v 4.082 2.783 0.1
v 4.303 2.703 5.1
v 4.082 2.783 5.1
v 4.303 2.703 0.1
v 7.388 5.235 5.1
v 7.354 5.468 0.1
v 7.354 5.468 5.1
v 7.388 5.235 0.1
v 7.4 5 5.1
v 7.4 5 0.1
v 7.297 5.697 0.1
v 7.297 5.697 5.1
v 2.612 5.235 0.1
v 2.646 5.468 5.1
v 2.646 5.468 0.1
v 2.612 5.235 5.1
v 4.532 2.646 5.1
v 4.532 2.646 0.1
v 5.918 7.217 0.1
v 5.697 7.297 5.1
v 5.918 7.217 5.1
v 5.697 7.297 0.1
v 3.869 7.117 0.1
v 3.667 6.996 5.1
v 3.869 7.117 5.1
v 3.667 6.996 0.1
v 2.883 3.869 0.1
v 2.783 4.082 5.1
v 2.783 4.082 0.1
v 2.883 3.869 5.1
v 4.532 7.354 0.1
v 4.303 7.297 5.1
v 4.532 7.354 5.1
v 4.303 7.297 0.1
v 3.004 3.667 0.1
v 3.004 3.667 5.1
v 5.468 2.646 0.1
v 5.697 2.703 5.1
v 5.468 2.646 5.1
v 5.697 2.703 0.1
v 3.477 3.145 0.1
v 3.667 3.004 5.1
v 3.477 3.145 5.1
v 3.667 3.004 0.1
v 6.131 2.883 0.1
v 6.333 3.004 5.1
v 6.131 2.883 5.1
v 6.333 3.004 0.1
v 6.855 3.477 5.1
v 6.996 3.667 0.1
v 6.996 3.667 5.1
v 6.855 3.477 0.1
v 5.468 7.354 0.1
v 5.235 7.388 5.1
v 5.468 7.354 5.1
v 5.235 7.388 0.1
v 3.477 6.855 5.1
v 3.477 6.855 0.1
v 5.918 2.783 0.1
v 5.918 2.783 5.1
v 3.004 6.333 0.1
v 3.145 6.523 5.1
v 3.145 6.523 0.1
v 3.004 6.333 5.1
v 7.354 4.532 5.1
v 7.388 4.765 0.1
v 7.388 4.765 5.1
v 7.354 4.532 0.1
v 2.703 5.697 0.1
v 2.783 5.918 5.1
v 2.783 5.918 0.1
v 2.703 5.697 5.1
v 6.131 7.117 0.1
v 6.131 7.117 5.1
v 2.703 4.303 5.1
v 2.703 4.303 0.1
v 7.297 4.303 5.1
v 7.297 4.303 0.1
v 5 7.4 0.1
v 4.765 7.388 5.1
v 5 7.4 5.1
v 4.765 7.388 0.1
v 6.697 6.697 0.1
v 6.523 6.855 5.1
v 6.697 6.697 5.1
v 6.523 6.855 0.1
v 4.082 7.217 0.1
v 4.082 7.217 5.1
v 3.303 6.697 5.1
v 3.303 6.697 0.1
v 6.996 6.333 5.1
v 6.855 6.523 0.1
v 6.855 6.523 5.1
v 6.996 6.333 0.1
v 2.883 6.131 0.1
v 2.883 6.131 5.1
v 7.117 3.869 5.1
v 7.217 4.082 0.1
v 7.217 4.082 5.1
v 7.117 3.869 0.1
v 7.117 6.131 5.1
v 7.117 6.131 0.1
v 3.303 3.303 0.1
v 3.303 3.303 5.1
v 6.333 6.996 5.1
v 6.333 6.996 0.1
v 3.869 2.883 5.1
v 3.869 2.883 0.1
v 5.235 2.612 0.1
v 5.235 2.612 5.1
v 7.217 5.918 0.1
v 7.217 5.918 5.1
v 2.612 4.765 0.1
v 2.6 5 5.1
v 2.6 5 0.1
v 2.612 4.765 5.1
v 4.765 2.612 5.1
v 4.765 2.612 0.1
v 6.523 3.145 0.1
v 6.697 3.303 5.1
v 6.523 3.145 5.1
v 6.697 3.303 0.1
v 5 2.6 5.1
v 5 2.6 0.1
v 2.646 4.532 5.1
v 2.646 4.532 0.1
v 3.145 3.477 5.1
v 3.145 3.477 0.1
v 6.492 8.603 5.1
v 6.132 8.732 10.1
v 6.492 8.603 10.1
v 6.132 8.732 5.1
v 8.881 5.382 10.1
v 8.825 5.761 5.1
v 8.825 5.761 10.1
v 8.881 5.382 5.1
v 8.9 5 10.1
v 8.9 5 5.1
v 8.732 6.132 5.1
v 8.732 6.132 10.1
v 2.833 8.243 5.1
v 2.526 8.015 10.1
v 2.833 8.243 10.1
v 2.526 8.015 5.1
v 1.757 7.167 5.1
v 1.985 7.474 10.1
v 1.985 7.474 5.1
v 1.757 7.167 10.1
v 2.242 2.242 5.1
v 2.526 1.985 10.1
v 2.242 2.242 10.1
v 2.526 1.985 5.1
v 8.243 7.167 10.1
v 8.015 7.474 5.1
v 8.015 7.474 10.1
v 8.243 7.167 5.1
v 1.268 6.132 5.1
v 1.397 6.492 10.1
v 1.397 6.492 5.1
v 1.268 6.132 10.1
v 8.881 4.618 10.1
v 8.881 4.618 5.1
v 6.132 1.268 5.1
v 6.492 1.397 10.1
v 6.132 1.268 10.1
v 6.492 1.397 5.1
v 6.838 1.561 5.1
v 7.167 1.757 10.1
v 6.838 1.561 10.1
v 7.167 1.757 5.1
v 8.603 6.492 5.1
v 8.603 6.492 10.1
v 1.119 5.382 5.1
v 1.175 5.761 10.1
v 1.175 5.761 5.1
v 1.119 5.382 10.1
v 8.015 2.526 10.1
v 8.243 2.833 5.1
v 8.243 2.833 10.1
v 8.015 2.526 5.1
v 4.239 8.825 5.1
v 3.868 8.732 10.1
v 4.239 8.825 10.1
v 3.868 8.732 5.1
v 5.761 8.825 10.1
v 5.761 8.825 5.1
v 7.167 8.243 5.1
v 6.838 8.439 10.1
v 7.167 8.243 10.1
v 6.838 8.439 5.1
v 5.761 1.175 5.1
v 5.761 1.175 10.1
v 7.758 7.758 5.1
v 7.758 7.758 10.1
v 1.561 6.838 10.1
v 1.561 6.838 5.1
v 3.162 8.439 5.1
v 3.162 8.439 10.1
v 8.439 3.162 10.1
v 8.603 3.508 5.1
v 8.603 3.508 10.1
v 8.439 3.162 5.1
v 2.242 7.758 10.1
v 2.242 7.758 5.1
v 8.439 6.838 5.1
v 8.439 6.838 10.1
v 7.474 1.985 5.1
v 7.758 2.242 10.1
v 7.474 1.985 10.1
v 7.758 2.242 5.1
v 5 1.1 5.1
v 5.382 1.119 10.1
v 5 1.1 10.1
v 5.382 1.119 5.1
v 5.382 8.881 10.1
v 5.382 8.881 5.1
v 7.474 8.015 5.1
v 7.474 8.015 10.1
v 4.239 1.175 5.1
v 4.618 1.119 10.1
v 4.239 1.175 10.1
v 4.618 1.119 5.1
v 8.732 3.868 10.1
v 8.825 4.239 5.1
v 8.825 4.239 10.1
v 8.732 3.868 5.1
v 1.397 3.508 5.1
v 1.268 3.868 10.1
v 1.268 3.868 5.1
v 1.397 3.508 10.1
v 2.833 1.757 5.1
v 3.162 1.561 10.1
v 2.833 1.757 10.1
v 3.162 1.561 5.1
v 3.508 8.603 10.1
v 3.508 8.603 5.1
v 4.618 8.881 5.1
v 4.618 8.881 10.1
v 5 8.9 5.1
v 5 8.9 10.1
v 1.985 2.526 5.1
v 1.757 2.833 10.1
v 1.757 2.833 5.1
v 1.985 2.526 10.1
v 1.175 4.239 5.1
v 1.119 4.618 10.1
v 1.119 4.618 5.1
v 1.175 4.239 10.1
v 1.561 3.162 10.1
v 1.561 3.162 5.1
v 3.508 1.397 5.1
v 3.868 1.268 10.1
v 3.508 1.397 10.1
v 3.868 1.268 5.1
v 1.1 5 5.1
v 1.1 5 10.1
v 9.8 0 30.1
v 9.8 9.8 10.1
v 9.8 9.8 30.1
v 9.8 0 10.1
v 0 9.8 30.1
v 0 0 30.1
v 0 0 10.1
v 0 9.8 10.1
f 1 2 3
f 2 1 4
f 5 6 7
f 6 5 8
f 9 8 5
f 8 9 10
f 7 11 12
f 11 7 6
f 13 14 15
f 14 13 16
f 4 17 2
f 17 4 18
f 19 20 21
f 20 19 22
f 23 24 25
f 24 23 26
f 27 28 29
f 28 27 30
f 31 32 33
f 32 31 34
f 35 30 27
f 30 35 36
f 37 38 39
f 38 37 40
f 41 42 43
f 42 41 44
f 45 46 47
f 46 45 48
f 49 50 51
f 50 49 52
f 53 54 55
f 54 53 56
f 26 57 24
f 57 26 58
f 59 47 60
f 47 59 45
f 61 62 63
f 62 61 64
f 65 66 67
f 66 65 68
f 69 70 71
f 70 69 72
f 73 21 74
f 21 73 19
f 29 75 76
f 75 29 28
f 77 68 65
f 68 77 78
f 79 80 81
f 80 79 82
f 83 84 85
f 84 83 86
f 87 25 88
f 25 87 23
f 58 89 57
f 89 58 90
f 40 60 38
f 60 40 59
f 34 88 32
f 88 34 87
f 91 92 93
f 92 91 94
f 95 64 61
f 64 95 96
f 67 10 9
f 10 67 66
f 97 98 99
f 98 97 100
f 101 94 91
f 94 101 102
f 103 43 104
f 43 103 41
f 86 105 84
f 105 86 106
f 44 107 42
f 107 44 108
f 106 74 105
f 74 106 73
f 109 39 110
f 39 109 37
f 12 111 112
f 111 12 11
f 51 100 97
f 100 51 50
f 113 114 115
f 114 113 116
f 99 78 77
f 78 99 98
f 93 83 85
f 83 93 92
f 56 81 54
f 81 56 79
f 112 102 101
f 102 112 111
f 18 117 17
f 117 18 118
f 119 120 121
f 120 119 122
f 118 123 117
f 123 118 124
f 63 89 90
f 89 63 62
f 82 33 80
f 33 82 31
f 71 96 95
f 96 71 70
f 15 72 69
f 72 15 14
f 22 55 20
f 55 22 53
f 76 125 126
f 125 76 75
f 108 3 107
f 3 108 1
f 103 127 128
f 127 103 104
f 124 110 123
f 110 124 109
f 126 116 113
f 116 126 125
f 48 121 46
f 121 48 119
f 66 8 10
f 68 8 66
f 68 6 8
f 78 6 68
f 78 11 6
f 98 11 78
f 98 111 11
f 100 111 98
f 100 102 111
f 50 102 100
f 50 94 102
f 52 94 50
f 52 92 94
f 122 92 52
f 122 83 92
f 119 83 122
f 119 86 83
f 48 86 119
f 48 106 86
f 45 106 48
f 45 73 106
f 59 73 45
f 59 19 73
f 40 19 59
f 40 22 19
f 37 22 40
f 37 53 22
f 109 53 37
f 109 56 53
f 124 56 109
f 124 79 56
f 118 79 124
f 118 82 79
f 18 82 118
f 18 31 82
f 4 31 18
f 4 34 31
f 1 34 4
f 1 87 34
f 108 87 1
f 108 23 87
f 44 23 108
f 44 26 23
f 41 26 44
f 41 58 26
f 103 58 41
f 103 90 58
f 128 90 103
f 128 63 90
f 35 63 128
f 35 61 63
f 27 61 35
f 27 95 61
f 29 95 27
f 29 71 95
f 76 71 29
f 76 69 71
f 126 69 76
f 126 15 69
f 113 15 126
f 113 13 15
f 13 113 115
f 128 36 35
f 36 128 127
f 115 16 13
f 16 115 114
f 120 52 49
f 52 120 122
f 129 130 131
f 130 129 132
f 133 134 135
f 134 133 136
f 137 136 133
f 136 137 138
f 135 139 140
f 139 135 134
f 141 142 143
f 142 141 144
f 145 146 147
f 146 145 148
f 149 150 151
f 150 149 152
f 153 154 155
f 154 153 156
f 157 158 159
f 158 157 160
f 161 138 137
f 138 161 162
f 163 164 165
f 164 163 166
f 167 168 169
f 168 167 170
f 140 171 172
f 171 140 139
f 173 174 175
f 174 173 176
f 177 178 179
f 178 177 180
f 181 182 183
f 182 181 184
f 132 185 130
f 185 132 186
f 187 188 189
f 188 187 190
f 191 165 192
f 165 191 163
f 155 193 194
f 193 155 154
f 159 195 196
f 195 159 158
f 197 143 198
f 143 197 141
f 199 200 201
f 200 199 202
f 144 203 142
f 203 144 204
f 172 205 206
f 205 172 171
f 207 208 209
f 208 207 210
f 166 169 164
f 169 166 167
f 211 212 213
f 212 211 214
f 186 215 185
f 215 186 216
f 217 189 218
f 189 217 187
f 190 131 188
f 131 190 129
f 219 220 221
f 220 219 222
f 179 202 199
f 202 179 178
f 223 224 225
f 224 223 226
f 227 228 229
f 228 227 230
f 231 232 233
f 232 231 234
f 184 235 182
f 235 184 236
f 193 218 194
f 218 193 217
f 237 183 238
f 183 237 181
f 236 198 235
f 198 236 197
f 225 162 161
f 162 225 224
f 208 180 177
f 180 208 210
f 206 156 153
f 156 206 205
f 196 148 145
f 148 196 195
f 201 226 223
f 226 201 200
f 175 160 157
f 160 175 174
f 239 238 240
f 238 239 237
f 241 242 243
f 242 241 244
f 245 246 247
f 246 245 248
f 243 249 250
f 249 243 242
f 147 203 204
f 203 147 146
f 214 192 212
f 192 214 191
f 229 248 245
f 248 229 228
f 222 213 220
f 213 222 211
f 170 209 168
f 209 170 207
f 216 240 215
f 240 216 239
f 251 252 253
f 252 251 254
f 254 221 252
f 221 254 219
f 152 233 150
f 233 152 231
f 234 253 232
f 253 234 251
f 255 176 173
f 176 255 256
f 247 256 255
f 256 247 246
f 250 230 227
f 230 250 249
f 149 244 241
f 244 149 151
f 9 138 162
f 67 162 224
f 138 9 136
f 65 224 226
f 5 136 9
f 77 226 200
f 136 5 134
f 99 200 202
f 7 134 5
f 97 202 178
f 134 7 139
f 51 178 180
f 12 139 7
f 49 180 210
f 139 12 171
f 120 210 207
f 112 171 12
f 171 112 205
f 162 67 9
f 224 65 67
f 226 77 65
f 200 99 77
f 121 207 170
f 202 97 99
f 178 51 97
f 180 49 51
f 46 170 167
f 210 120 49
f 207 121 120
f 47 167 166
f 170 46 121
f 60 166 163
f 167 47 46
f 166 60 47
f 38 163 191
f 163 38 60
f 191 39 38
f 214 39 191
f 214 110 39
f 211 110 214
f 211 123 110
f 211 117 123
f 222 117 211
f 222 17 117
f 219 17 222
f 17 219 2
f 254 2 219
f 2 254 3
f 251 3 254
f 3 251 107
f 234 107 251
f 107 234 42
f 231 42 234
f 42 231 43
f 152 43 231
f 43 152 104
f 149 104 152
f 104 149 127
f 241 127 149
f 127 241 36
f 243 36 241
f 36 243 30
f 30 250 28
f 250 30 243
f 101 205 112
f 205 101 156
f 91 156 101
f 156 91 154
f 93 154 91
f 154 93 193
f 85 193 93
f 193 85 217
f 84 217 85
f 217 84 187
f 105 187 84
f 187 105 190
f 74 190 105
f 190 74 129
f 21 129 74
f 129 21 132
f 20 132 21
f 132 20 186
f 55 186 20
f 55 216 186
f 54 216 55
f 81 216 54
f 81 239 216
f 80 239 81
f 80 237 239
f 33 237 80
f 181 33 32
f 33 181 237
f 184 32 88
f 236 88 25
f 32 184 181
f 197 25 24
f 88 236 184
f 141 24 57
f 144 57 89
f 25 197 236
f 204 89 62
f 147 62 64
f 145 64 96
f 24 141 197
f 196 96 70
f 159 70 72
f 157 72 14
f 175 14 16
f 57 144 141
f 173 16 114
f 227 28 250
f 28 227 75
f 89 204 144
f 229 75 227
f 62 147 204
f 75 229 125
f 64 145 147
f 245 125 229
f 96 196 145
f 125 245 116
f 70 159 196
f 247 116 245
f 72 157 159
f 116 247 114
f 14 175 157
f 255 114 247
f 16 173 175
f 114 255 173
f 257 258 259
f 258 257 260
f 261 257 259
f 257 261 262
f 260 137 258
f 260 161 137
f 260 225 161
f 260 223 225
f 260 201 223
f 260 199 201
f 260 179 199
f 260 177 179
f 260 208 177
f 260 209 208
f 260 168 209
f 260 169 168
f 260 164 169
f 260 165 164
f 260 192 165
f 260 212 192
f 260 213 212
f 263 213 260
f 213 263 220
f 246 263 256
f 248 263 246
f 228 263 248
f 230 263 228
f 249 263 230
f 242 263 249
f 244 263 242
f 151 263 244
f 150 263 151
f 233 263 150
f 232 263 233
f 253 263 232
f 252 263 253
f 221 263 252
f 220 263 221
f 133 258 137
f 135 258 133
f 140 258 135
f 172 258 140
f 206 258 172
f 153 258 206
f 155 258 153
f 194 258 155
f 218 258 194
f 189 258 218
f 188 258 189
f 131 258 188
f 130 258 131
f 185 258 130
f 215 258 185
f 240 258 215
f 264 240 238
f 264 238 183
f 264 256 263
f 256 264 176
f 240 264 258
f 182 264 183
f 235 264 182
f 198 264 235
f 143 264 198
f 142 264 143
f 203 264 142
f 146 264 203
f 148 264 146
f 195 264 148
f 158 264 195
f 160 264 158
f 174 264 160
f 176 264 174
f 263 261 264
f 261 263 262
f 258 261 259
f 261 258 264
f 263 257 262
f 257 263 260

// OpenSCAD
// file: constants.scad
//
//
//

$fn = 64;

$dx_unit = 10;
$dy_unit = 10;
$dz_unit = 10;

$r_inner = 2.5;
$r_outer = 4;

$play = 0.1;

$eps = 0.002;
// main file
include <constants.scad>

peg( 20 );

module peg( height ) {
    translate( [ $dx_unit/2, $dy_unit/2, $play ] ) {
        cylinder( h = $dz_unit + $eps, r = $r_inner-$play );
    };
    translate( [ $dx_unit/2, $dy_unit/2, $dz_unit/2 + $play ] ) {
        cylinder( h = $dz_unit/2 + $eps, r = $r_outer-$play );
    };
    translate( [ 0, 0, $dz_unit + $play ] ) {
        cube( [ $dx_unit-2*$play, $dy_unit-2*$play, height ] );
    };
};
